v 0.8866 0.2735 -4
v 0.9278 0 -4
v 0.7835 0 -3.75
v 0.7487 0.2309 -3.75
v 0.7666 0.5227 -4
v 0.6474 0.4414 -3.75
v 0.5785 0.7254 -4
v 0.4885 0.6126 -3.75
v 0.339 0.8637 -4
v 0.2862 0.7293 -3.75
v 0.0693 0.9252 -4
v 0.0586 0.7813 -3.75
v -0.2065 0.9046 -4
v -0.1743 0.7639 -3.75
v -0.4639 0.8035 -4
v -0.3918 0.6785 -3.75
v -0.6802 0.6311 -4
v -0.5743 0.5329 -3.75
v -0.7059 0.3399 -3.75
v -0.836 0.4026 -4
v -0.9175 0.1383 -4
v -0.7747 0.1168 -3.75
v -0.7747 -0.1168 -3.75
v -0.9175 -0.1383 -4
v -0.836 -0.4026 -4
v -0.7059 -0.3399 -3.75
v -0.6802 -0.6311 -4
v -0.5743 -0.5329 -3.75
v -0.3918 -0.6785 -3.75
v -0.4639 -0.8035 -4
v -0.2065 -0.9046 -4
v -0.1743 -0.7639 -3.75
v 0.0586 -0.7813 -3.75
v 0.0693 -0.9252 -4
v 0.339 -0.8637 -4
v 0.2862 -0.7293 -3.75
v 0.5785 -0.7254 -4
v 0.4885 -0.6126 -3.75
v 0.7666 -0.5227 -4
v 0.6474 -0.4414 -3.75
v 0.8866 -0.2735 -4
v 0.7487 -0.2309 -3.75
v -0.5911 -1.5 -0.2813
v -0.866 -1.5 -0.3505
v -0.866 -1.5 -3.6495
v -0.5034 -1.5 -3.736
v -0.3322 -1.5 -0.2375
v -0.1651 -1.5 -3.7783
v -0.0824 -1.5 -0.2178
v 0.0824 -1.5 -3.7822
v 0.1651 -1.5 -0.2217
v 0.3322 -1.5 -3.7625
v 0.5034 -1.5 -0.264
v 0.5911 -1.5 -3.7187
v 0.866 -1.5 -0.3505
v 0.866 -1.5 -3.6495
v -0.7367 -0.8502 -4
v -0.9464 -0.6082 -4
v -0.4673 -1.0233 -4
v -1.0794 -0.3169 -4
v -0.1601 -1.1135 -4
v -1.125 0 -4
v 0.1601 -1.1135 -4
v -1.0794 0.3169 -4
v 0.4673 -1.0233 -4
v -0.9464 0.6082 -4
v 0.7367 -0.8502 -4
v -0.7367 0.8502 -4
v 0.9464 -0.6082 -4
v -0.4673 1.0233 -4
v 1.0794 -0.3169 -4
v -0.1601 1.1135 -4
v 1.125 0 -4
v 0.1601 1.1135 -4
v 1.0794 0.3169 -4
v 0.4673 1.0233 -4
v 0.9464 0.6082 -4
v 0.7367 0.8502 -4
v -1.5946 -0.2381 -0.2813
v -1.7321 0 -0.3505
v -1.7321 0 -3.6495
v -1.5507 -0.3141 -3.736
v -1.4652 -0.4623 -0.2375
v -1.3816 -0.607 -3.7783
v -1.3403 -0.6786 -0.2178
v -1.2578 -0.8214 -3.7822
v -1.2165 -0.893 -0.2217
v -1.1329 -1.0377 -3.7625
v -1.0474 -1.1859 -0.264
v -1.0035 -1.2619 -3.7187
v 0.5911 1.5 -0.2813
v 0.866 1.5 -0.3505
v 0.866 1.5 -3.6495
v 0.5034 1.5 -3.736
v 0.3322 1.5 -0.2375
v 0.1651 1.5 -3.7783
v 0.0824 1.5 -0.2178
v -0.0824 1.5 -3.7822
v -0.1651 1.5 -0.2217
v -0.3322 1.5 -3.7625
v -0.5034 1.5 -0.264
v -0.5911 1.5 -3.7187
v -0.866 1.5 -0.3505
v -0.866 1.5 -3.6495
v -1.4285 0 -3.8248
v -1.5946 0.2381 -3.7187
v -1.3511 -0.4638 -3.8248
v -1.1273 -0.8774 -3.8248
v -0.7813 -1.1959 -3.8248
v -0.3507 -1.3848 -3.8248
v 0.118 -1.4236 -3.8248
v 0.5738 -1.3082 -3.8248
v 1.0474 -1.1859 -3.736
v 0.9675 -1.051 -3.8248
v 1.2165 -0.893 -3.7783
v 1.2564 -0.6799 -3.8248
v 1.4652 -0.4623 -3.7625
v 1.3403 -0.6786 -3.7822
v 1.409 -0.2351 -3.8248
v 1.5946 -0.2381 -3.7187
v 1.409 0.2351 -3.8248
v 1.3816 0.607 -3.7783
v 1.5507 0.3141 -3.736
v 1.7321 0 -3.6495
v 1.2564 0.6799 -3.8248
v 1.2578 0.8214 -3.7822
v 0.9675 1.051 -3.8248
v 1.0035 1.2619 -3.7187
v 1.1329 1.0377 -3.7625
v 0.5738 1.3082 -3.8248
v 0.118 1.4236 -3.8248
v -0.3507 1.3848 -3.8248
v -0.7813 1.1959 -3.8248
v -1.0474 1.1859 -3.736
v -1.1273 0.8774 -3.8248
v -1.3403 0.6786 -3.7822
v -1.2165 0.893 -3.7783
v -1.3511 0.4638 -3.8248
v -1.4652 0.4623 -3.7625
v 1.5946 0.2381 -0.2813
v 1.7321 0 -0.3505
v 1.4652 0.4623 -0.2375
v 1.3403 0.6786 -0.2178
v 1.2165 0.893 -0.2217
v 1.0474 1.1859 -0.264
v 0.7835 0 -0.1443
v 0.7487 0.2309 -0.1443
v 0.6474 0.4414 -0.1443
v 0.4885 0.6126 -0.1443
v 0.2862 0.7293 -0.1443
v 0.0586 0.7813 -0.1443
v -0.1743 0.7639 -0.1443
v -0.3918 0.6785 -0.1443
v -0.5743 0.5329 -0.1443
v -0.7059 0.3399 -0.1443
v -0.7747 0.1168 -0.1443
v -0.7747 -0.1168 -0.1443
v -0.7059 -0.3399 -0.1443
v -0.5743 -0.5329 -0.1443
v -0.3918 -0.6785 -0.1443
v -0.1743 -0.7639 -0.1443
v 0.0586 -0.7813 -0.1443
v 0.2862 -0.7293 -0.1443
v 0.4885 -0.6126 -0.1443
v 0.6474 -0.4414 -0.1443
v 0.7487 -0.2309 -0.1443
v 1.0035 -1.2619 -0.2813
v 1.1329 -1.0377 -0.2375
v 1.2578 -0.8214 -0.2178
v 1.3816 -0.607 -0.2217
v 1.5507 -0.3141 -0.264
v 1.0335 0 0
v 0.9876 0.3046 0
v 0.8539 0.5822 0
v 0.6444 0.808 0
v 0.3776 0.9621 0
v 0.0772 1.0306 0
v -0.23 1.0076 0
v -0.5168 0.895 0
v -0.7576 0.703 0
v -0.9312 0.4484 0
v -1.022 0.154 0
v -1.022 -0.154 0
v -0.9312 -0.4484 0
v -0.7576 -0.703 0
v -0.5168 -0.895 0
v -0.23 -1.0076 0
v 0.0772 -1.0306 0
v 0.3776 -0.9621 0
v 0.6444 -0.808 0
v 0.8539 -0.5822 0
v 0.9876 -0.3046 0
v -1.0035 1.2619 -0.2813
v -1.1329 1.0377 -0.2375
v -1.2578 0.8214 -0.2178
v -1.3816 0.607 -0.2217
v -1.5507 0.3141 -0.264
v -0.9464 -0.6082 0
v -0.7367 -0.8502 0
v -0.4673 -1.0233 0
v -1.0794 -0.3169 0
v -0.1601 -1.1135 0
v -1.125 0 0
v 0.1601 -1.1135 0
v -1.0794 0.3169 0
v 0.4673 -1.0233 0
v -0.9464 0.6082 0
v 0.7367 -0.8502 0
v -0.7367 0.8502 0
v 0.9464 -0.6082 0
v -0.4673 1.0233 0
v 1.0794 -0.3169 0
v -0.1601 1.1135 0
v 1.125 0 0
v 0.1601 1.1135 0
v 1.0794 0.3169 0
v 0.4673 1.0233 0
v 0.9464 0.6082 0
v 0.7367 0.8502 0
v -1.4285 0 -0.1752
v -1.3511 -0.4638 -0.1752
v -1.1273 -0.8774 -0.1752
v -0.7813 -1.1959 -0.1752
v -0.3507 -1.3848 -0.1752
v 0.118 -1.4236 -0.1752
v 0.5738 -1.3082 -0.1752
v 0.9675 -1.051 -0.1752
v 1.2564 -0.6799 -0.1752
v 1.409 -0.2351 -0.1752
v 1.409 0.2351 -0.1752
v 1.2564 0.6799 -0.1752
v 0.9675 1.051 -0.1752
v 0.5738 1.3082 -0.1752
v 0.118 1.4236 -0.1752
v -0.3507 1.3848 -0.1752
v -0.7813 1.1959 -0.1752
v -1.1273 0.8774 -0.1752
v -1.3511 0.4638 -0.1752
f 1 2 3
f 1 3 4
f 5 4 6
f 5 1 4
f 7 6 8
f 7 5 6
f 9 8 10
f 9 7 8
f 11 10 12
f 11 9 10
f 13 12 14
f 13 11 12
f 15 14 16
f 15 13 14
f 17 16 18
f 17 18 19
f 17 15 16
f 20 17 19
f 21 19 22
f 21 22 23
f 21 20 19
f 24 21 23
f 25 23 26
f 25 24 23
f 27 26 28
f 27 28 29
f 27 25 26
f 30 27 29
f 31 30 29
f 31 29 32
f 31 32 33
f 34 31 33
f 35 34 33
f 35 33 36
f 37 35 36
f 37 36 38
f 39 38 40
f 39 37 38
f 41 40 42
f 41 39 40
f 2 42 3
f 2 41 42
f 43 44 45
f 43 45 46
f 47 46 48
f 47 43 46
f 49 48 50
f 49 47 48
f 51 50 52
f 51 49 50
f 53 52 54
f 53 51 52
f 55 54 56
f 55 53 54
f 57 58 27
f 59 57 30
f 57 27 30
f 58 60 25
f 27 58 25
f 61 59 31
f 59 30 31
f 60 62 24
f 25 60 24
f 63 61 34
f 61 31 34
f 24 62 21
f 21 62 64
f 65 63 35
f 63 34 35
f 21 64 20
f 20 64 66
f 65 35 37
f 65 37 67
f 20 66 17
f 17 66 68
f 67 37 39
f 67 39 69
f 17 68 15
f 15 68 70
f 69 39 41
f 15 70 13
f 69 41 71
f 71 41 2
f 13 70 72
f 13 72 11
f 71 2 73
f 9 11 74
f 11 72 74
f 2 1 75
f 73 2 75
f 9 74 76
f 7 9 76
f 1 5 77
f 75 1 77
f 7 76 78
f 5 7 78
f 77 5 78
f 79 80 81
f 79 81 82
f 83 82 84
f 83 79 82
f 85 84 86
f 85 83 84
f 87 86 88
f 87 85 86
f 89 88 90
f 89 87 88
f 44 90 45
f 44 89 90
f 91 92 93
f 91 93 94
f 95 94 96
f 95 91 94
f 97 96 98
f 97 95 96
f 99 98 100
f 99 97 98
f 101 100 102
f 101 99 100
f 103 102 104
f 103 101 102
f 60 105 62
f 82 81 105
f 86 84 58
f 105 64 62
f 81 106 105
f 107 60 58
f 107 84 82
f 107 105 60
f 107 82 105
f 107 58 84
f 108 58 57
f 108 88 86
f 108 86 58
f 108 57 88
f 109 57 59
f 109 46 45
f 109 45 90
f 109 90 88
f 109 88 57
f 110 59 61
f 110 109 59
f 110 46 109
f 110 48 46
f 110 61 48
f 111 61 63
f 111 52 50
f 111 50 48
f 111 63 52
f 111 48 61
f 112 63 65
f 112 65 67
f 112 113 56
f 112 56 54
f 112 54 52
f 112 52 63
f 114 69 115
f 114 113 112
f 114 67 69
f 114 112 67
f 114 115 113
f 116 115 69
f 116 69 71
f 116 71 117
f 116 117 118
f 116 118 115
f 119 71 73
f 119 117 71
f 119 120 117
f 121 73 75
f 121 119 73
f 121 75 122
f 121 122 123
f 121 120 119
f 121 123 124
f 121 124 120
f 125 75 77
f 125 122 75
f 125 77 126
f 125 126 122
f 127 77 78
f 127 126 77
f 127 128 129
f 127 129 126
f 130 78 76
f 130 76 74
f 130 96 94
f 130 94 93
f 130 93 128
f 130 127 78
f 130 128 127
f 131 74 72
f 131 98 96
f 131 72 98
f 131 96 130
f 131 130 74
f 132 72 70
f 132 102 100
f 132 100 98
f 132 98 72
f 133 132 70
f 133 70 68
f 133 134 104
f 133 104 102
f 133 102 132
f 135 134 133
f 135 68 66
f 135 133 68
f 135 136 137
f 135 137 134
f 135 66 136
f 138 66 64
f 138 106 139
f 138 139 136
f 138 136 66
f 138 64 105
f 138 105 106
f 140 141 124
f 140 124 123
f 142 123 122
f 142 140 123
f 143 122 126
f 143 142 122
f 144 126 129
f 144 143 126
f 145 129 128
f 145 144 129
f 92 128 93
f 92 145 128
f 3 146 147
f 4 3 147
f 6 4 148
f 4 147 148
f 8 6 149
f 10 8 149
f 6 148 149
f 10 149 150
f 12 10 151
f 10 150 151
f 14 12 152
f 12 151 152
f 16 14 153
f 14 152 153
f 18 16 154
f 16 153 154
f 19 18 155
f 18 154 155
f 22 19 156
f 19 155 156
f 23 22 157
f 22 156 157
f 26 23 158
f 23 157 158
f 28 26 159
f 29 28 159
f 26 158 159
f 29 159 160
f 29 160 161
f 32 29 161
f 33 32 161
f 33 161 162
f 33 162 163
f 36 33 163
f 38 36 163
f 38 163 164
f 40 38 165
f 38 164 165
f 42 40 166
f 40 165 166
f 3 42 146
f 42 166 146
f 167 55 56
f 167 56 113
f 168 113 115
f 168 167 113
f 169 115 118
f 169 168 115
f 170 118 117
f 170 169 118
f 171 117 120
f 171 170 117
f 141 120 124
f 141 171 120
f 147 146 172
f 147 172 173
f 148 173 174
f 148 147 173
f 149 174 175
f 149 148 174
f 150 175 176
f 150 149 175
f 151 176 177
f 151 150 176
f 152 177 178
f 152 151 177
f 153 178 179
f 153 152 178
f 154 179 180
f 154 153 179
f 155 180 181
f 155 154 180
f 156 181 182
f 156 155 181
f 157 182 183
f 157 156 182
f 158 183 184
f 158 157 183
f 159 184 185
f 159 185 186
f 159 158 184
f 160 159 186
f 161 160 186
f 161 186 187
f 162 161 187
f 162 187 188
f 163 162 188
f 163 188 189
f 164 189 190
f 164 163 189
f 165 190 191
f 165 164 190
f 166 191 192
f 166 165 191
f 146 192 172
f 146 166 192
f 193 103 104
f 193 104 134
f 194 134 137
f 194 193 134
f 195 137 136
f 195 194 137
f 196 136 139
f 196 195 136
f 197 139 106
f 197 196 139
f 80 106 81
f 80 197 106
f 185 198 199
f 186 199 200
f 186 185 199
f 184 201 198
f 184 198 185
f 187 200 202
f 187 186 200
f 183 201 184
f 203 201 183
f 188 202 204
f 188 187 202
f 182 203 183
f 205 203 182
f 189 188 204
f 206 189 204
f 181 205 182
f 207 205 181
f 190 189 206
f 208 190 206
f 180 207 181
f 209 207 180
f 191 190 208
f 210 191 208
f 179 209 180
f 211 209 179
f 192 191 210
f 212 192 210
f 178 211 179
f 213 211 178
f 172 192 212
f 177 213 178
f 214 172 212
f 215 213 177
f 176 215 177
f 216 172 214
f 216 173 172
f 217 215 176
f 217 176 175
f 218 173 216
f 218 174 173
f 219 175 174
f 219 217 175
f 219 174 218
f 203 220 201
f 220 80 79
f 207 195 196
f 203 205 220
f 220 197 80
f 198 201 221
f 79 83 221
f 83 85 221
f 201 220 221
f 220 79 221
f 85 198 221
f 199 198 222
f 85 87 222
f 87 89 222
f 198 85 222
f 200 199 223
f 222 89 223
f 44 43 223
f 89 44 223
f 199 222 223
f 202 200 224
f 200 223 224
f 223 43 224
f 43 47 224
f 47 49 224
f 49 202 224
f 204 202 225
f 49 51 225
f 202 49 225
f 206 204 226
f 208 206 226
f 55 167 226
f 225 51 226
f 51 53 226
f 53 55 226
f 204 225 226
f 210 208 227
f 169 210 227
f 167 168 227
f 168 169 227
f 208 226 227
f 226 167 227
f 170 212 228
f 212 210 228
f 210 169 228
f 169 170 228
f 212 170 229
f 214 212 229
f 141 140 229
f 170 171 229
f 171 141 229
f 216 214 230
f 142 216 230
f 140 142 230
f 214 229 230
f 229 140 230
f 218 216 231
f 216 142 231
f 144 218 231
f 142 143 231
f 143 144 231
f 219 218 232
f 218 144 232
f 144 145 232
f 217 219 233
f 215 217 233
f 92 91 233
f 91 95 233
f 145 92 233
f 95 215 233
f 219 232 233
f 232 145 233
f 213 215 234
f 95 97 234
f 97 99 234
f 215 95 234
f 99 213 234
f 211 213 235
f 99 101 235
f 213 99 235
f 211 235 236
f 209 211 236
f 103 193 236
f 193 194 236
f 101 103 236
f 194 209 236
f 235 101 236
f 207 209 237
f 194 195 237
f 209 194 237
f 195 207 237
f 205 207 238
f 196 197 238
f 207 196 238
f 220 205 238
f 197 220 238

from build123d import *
from OCP.BRepFilletAPI import BRepFilletAPI_MakeChamfer

# Parameters (mm, degrees)
SKETCH1_R        = 0.7835
BASENUT_DEPTH    = 4
ENDCHAMFER_SIZE  = 0.25
ENDCHAMFER_SIZE2 = 0.144337567


with BuildPart() as part:
    # Sketch1 → BaseNut (new body)
    with BuildSketch(Plane.XY):
        Polygon((0.866025404, -1.5), (1.732050808, 0), (0.866025404, 1.5), (-0.866025404, 1.5), (-1.732050808, 0), (-0.866025404, -1.5), align=None)
        Circle(SKETCH1_R, mode=Mode.SUBTRACT)
    extrude(amount=-BASENUT_DEPTH)

    # Sketch2 → Double-Chamfer (revolve, cut)
    with BuildSketch(Plane(origin=(0, 0, 0), x_dir=(1, 0, 0), z_dir=(0, 1, 0))):
        Polygon((-1.732050808, 4), (-1.125, 4), (-1.732050808, 3.649519053), align=None)
        Polygon((-1.732050808, 0.350480947), (-1.732050808, 0), (-1.125, 0), align=None)
    revolve(axis=Axis((0, 0, -9.817107763), (0, 0, 1)), mode=Mode.SUBTRACT)

    # EndChamfer: one chamfer whose edges measure the first distance from different faces: ONE call of the kernel's chamfer builder (chamfer() names one face for all edges)
    endchamfer_edges_1 = [part.edges().sort_by_distance(p)[0] for p in [
        (-0.7835, 0, -4),
    ]]
    endchamfer_side_1 = [part.faces().sort_by_distance(p)[0] for p in [
        (-0.7835, 0, -2),
    ]]
    endchamfer_edges_2 = [part.edges().sort_by_distance(p)[0] for p in [
        (-0.7835, 0, 0),
    ]]
    endchamfer_side_2 = [part.faces().sort_by_distance(p)[0] for p in [
        (1.093180195, 0, 0),
    ]]
    endchamfer = BRepFilletAPI_MakeChamfer(part.part.solid().wrapped)
    for e in endchamfer_edges_1:
        endchamfer.Add(ENDCHAMFER_SIZE, ENDCHAMFER_SIZE2, e.wrapped, endchamfer_side_1[0].wrapped)  # the first distance lies on this face
    for e in endchamfer_edges_2:
        endchamfer.Add(ENDCHAMFER_SIZE, ENDCHAMFER_SIZE2, e.wrapped, endchamfer_side_2[0].wrapped)  # the first distance lies on this face
    add(Compound.cast(endchamfer.Shape()), mode=Mode.REPLACE)


solid = part.part
